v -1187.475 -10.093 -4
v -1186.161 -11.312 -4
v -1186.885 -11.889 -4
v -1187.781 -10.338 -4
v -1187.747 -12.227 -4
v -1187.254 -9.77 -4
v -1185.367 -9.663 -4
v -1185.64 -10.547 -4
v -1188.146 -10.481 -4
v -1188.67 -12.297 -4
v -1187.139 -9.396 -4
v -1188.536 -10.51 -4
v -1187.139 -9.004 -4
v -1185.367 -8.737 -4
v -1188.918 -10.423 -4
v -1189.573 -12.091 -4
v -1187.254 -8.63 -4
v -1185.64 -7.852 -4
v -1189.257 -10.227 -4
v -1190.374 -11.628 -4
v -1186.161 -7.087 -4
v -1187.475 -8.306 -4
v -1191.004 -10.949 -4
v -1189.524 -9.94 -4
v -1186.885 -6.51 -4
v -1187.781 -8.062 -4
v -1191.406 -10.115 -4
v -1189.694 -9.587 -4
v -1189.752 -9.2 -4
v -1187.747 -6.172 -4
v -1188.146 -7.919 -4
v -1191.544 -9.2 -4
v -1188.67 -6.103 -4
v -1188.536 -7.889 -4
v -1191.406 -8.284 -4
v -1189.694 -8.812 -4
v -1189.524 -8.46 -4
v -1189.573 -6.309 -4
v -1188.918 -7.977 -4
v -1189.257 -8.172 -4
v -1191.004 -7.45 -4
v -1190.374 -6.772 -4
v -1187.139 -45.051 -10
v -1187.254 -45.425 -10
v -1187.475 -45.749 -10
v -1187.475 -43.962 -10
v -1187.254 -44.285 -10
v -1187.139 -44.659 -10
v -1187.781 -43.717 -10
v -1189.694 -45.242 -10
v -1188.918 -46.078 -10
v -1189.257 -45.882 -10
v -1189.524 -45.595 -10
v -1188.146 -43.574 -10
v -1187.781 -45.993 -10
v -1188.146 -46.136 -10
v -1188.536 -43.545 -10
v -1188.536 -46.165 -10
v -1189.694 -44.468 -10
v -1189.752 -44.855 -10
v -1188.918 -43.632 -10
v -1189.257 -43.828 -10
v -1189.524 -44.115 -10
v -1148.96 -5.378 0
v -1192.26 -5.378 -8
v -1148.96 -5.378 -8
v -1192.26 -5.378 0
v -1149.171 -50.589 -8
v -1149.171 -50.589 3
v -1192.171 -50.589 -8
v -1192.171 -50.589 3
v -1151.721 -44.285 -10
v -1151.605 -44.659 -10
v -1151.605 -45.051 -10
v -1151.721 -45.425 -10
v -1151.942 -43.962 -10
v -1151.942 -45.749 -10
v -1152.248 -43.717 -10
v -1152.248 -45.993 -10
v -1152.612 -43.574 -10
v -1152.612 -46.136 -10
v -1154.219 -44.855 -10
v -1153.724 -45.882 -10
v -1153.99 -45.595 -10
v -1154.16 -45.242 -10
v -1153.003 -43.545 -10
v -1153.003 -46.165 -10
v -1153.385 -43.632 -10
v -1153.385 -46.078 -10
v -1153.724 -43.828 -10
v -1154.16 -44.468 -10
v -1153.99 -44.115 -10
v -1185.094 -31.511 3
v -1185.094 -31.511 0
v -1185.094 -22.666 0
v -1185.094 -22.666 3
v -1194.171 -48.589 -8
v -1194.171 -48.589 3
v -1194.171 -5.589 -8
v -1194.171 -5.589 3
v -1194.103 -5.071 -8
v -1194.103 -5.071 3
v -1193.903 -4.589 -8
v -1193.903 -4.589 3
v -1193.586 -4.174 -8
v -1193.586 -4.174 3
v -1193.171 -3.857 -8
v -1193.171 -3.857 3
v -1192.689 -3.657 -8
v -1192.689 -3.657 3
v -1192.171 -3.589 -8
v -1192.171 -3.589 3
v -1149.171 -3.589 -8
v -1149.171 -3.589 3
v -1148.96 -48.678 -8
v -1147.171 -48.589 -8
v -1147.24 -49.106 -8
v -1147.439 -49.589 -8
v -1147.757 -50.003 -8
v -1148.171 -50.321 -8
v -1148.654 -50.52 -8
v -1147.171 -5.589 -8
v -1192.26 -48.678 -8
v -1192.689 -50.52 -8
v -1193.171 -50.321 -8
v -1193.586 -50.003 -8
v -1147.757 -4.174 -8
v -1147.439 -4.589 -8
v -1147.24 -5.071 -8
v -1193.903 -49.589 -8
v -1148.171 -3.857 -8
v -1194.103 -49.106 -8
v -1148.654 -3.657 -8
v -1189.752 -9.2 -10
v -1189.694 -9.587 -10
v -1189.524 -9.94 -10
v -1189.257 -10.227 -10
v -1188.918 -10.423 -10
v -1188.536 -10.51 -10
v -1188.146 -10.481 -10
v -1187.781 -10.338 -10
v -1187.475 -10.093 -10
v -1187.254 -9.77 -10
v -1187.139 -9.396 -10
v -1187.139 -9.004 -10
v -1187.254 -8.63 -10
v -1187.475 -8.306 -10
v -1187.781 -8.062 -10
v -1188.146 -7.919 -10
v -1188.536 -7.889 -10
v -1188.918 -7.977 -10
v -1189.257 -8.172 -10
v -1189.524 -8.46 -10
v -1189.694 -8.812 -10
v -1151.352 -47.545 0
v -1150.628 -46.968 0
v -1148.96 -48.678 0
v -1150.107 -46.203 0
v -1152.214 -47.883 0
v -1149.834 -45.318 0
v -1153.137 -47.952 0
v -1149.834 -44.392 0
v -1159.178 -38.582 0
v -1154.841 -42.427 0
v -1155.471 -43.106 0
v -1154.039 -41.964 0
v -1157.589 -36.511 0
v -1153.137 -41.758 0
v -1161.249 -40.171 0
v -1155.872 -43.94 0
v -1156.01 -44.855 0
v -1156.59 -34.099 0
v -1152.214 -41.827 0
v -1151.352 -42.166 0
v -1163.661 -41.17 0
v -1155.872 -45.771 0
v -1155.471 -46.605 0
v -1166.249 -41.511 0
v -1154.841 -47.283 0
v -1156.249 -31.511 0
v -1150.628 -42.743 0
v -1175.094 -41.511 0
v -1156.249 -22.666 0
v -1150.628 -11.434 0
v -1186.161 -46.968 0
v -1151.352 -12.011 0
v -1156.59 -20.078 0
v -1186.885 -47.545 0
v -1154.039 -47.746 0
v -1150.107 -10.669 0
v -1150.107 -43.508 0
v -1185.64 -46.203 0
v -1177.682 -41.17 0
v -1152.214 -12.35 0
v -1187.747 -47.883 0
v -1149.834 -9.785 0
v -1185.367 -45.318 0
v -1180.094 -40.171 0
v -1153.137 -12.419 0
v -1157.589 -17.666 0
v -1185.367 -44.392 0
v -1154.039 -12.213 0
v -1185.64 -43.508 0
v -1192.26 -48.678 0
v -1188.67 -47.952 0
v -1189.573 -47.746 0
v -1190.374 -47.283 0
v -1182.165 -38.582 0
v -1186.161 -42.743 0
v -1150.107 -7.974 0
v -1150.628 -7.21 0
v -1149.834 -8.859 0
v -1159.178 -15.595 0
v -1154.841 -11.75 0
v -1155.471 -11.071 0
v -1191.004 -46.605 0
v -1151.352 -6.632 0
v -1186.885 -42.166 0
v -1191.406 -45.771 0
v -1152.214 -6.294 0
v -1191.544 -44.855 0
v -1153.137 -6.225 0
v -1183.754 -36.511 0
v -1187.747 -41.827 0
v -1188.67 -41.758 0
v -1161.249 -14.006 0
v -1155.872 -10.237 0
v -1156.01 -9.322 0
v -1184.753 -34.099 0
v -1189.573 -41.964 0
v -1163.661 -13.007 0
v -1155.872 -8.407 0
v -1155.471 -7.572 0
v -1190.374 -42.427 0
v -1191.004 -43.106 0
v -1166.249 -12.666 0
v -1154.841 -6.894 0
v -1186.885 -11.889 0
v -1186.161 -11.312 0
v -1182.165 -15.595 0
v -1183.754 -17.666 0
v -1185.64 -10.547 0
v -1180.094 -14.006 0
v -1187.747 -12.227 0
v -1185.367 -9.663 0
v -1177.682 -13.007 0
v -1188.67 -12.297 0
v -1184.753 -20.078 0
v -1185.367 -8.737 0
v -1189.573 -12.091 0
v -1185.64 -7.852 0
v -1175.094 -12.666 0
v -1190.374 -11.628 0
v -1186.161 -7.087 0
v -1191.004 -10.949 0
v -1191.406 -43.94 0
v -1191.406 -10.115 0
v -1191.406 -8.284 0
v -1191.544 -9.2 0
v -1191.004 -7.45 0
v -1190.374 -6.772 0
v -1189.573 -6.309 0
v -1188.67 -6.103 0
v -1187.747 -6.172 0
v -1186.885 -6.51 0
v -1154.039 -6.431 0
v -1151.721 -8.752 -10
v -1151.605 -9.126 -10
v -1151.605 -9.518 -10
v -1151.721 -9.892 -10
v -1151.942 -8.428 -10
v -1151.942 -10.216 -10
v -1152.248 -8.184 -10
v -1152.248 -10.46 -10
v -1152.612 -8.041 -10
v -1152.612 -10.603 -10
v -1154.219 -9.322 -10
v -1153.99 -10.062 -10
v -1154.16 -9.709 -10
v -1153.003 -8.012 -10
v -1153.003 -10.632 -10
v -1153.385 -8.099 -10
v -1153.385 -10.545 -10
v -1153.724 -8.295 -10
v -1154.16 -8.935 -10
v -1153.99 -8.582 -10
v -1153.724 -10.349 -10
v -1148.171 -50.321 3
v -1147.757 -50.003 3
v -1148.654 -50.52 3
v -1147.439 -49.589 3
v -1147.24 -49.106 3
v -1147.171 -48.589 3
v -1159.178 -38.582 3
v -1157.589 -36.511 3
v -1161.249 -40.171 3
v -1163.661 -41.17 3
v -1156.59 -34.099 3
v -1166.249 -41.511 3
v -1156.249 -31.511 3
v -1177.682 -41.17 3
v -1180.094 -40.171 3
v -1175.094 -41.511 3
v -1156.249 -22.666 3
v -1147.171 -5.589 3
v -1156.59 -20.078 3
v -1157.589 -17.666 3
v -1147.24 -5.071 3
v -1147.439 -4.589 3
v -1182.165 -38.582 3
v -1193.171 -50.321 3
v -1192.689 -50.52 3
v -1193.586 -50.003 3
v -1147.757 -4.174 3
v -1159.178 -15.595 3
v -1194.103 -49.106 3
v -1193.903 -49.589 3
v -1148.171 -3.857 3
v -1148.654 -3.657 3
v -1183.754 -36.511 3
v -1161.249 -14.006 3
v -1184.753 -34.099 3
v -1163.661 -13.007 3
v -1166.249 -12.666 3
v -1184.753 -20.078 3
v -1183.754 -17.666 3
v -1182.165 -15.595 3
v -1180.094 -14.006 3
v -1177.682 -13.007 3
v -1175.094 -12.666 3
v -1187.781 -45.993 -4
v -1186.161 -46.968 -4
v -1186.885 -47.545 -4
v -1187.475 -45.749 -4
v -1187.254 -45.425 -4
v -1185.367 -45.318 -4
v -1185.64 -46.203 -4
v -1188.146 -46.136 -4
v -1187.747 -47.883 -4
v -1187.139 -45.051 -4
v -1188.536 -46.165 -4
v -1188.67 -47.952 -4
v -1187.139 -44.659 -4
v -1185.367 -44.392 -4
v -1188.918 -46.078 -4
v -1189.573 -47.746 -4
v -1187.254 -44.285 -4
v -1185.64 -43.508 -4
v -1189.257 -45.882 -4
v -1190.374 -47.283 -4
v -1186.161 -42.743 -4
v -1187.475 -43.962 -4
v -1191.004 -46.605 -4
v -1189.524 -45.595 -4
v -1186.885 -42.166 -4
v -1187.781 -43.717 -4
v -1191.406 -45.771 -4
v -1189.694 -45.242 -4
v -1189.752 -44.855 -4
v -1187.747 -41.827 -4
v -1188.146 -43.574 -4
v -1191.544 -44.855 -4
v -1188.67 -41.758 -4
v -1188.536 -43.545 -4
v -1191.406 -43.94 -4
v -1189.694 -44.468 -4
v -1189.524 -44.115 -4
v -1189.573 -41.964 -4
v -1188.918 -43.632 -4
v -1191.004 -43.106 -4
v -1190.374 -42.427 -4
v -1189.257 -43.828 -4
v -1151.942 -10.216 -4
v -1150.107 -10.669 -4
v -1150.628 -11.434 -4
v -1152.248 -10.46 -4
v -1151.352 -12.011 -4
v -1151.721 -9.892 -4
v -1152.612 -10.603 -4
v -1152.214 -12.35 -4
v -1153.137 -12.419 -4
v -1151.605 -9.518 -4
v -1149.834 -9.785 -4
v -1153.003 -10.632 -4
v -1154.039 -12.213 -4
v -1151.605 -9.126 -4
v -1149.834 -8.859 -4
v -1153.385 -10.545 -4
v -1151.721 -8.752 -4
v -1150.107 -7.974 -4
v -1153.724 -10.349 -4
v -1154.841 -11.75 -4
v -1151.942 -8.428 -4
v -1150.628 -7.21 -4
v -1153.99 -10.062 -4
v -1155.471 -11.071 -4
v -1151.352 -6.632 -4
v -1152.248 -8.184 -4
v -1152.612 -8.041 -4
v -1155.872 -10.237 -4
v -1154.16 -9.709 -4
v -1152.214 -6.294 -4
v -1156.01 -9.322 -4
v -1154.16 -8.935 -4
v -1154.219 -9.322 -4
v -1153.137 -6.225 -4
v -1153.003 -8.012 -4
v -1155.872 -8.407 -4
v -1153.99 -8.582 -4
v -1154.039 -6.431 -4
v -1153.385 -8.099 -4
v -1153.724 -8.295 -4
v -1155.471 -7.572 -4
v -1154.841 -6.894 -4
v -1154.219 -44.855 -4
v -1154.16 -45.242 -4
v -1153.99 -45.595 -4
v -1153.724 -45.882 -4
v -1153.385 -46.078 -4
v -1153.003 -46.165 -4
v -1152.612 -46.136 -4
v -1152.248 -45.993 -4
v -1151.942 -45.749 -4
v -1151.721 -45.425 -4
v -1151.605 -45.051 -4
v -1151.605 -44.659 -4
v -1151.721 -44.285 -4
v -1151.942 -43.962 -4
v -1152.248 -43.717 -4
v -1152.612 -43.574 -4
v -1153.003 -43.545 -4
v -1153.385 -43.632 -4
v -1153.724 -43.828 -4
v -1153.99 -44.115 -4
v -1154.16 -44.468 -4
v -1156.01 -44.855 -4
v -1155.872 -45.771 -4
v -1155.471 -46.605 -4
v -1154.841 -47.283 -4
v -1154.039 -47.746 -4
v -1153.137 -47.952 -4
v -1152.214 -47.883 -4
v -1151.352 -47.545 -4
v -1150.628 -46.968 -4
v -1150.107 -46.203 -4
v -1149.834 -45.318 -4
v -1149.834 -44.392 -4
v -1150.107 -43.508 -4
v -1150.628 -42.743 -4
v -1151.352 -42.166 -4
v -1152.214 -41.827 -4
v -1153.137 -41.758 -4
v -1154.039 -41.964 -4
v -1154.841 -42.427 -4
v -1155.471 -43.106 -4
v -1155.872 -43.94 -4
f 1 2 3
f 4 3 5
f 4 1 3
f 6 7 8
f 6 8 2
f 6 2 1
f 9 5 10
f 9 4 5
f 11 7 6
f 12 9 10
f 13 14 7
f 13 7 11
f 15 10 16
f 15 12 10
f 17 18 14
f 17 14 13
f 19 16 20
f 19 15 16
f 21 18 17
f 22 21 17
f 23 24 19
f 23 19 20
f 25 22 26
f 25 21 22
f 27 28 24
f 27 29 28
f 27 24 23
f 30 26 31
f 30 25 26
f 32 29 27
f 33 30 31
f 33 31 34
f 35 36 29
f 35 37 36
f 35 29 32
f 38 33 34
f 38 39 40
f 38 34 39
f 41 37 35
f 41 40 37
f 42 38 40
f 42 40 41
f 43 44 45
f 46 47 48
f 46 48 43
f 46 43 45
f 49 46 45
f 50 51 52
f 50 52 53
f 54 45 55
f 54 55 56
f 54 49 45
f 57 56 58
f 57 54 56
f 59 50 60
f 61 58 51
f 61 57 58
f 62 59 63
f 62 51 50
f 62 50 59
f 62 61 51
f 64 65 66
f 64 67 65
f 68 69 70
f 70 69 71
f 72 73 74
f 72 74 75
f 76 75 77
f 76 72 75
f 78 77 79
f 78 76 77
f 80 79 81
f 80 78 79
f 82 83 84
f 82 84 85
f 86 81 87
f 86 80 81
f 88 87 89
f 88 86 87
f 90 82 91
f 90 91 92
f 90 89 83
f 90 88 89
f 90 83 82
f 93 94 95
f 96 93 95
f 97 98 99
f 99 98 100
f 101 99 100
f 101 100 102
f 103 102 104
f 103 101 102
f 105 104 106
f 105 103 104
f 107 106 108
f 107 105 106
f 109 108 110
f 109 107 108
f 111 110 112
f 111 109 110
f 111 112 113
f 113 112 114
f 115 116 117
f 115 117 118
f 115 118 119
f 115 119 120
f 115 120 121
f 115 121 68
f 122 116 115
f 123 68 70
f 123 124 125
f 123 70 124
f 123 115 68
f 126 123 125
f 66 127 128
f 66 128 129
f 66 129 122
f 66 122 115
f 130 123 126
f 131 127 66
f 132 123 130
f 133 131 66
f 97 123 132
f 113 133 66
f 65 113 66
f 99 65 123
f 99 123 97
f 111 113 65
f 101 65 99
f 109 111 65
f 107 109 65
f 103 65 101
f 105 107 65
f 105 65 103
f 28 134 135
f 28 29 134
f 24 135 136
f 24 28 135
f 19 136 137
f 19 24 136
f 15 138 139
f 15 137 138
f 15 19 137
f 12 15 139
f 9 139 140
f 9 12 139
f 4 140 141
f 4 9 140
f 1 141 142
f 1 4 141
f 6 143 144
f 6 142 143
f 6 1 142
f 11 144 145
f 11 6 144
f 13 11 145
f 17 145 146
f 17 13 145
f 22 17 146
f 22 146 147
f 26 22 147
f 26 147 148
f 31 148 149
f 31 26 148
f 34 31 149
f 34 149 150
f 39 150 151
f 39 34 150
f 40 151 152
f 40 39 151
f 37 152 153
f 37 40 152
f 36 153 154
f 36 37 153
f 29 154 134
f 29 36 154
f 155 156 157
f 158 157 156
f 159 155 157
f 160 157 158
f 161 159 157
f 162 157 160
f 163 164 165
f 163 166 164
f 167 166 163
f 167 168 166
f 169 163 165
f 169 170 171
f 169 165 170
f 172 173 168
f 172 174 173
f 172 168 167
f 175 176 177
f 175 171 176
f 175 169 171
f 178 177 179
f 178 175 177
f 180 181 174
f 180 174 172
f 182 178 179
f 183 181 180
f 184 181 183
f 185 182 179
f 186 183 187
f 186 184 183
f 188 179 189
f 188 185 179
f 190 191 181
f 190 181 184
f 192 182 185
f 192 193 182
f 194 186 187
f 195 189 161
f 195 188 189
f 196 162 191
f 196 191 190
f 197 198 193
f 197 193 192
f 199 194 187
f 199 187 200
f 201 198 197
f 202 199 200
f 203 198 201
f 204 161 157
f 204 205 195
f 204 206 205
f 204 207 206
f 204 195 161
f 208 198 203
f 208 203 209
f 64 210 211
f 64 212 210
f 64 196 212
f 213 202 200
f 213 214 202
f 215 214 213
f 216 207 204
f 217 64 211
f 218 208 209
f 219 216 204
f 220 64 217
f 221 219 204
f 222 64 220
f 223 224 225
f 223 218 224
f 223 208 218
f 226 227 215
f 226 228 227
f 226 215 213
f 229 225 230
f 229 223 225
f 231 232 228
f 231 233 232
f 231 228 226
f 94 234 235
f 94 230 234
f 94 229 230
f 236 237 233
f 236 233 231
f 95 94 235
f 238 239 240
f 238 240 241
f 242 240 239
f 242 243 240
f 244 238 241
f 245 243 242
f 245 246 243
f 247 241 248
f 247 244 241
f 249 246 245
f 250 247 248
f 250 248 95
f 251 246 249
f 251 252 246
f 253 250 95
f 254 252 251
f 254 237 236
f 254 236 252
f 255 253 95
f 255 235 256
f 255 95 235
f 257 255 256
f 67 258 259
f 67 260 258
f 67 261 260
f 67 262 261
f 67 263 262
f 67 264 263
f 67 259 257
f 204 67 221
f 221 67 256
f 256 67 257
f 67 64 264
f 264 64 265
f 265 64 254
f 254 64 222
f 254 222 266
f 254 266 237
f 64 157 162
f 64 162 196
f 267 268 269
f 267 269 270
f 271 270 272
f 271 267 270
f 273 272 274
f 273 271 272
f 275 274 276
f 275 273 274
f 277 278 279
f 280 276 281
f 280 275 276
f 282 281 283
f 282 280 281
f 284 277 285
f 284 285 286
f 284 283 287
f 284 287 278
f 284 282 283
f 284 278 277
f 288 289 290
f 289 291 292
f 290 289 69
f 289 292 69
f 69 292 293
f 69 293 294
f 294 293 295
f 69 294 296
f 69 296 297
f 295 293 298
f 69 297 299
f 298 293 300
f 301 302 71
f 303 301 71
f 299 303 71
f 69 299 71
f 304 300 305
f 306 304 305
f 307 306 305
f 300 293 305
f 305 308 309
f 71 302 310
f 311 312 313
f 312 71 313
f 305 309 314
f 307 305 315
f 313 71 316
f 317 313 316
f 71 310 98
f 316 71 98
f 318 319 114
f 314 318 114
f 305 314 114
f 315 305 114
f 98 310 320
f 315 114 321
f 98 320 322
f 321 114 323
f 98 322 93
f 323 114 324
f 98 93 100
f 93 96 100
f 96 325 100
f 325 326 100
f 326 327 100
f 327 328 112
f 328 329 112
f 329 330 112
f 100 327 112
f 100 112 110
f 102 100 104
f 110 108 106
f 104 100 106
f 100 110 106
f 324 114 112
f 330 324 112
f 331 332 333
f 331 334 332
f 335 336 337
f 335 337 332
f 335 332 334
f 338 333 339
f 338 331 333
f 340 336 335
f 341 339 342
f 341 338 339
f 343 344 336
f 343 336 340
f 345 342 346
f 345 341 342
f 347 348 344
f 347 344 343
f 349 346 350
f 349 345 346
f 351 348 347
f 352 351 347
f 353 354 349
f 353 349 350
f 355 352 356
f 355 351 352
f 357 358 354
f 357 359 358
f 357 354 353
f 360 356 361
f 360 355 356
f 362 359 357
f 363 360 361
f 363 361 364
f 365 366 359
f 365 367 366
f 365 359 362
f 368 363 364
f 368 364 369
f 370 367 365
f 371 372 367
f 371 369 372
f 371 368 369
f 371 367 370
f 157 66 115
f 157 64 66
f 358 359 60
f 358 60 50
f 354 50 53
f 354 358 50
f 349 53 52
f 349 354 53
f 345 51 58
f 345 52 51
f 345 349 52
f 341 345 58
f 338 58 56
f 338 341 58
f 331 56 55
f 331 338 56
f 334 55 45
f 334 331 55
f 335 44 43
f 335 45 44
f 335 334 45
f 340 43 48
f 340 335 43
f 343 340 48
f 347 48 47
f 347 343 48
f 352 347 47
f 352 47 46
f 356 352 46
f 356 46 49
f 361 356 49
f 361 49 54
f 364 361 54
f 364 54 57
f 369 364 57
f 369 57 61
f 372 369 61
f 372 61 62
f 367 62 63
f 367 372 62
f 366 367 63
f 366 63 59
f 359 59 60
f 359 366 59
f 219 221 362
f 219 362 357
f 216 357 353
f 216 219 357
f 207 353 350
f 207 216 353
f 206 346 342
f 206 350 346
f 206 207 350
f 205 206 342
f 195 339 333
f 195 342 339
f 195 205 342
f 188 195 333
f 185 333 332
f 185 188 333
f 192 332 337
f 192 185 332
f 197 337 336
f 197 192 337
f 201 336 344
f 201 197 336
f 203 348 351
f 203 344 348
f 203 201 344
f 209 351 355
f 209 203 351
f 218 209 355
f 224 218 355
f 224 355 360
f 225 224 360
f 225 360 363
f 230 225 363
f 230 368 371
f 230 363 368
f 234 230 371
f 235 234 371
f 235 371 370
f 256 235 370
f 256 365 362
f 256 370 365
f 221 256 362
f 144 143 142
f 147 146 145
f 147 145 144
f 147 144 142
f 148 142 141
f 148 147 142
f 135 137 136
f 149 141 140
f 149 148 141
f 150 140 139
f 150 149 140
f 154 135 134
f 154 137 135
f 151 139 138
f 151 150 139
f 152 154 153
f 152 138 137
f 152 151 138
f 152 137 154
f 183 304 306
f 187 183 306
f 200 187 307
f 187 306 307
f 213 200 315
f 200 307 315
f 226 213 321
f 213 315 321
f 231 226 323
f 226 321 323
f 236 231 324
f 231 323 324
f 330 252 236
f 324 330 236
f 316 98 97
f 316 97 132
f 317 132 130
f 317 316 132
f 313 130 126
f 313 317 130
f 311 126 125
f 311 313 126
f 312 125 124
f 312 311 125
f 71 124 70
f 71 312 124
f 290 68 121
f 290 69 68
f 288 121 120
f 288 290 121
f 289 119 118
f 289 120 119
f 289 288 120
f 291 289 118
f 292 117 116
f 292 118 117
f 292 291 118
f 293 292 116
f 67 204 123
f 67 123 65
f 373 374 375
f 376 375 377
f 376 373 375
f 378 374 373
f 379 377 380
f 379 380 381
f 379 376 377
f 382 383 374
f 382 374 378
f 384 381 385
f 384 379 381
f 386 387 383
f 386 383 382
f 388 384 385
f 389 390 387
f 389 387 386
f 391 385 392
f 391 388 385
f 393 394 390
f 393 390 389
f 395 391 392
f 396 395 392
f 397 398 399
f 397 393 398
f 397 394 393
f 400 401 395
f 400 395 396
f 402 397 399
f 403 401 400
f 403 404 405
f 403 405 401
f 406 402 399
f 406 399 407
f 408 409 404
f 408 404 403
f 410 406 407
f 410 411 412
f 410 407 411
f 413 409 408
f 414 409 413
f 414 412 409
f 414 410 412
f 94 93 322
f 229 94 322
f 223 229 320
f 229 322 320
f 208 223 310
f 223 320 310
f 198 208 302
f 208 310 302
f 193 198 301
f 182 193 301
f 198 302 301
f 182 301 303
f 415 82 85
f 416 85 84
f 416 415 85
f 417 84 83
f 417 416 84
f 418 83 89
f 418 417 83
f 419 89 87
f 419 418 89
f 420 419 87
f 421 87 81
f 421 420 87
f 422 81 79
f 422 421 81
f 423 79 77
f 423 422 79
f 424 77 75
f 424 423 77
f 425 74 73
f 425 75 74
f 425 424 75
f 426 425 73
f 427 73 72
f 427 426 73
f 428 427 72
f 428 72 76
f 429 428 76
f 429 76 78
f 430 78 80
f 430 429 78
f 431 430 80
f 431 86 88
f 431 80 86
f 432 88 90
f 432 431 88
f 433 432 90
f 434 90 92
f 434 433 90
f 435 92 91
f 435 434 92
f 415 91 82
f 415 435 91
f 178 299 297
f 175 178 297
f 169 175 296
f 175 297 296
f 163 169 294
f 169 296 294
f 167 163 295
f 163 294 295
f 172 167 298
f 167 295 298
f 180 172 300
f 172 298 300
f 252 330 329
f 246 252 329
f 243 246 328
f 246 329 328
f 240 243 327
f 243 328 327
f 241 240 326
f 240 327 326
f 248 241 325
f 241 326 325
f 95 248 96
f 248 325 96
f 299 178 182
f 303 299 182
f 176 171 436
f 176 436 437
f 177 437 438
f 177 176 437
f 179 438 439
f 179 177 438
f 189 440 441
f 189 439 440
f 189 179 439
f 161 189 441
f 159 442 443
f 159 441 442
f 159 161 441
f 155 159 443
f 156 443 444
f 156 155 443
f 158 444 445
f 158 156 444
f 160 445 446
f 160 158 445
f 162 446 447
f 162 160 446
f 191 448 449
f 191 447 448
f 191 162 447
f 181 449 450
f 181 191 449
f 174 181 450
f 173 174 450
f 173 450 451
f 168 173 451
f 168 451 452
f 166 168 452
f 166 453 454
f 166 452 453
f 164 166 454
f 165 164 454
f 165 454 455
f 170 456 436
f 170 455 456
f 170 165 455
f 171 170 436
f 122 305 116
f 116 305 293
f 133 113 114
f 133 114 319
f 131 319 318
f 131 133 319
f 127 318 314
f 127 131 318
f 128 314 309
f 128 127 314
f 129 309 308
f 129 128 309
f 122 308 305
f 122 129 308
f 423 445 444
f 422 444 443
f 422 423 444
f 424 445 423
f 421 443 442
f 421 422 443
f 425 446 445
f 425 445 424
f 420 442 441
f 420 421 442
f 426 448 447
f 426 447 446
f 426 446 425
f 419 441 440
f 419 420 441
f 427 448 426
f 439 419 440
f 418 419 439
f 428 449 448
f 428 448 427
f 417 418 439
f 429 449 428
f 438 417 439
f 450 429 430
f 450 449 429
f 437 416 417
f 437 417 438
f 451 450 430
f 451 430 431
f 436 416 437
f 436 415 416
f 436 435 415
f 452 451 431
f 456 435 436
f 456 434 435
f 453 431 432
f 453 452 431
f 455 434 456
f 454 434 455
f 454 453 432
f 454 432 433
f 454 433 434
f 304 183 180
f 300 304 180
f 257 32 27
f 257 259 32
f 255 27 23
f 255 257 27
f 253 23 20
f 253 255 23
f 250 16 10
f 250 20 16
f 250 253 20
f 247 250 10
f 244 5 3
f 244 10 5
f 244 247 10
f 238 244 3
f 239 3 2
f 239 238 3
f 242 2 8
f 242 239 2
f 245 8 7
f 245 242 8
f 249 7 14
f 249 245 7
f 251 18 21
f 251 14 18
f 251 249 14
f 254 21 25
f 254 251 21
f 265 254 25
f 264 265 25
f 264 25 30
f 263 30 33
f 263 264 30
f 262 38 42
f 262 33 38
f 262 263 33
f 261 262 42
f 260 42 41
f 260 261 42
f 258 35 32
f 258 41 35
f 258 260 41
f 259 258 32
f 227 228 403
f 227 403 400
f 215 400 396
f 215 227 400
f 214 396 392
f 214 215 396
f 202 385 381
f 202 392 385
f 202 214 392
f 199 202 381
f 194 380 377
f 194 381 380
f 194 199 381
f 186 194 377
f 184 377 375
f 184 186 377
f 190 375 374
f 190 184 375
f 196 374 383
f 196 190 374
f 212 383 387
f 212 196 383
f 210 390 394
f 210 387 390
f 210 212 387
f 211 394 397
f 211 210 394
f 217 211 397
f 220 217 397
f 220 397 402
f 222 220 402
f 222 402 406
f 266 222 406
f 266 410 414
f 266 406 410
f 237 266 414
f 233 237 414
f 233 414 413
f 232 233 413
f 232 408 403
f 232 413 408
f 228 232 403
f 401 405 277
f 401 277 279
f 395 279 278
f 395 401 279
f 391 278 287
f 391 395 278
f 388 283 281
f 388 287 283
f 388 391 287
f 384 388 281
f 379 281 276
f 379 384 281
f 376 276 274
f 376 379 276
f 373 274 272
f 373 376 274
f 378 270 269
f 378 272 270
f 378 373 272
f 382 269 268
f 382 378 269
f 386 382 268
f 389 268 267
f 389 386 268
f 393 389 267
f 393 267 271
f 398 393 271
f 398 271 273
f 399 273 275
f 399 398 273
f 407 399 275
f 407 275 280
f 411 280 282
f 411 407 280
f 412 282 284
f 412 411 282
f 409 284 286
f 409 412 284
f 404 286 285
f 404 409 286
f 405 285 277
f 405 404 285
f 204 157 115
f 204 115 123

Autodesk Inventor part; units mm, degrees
ref_plane "YZ Plane" through (0, 0, 0) normal (1, 0, 0) x (0, 1, 0)
ref_plane "XZ Plane" through (0, 0, 0) normal (0, 1, 0) x (-1, 0, 0)
ref_plane "XY Plane" through (0, 0, 0) normal (0, 0, 1) x (1, 0, 0)
ref_plane "Work Plane3" through (-1117.6, -50.8, 0) normal (0, 0, -1) x (-1, 0, 0)
sketch "Sketch1" plane through (-1117.6, -50.8, 0) normal (0, 0, -1) x (-1, 0, 0)
  line L0 (76.5714, 47.2114) -> (29.5714, 47.2114)
  line L1 (29.5714, 47.2114) -> (29.5714, 0.2114)
  line L2 (29.5714, 0.2114) -> (76.5714, 0.2114)
  line L3 (76.5714, 0.2114) -> (76.5714, 47.2114)
  circle A0 centre (70.838, 41.6003) radius 1.3139
  line L4 (74.6603, 45.4225) -> (31.3603, 45.4225)
  line L5 (31.3603, 45.4225) -> (31.3603, 2.1225)
  line L6 (31.3603, 2.1225) -> (74.6603, 2.1225)
  line L7 (74.6603, 2.1225) -> (74.6603, 45.4225)
  circle A1 centre (35.3047, 41.4781) radius 1.3139
  circle A2 centre (35.3047, 5.9448) radius 1.3139
  circle A3 centre (70.838, 5.9448) radius 1.3139
  circle A4 centre (35.3047, 5.9448) radius 3.1056
  circle A5 centre (70.838, 5.9448) radius 3.1056
  circle A6 centre (70.838, 41.6003) radius 3.1056
  circle A7 centre (35.3047, 41.4781) radius 3.1056
  line L8 (38.6492, 9.2892) -> (67.4936, 9.2892)
  line L9 (67.4936, 9.2892) -> (67.4936, 38.1337)
  line L10 (67.4936, 38.1337) -> (38.6492, 38.1337)
  line L11 (38.6492, 38.1337) -> (38.6492, 9.2892)
  point P0 (-1117.6, 50.8)
  point P1 (53.0714, 47.2114)
  point P2 (53.0714, 0.2114)
  dimension "d1" = 47
  dimension "d2" = 47
  dimension "d4" = 2.6278
  dimension "d5" = 5.7333
  dimension "d6" = 1.9111
  dimension "d7" = 1.9111
  dimension "d8" = 43.3
  dimension "d9" = 43.3
  dimension "d10" = 2.6278
  dimension "d11" = 3.8222
  dimension "d12" = 5.7333
  dimension "d13" = 5.7333
  dimension "d14" = 2.6278
  dimension "d15" = 5.7333
  dimension "d16" = 5.7333
  dimension "d17" = 2.6278
  dimension "d18" = 5.7333
  dimension "d19" = 3.8222
  dimension "d20" = 6.2111
  dimension "d21" = 6.2111
  dimension "d22" = 6.2111
  dimension "d23" = 6.2111
  dimension "d24" = 9.0778
  dimension "d25" = 9.0778
  dimension "d26" = 9.0778
  dimension "d27" = 9.0778
extrude "Extrusion3" add sketch "Sketch1" along normal blind 8 contours L3 L2 L1 L0
extrude "Extrusion6" add sketch "Sketch1" along normal blind 10 contours A0 | A1 | A2 | A3
extrude "Extrusion7" add sketch "Sketch1" along normal blind 4 contours A2 | A4 | A5 | A6 | A7
extrude "Extrusion8" add sketch "Sketch1" against normal blind 3 contours L3 L2 L1 L0 | A0 | L7 L6 L5 L4 | A1 | A2 | A3 | A4 | A5 | A6 | A7
fillet "Fillet5" radius 10 4 edges at (-1156.2492, -12.6663, 1.5) (-1185.0936, -12.6663, 1.5) (-1185.0936, -41.5108, 1.5) (-1156.2492, -41.5108, 1.5)
fillet "Fillet6" radius 2 4 edges at (-1194.1714, -3.5886, -2.5) (-1147.1714, -3.5886, -2.5) (-1194.1714, -50.5886, -2.5) (-1147.1714, -50.5886, -2.5)
properties part number "mnt298bracket"
